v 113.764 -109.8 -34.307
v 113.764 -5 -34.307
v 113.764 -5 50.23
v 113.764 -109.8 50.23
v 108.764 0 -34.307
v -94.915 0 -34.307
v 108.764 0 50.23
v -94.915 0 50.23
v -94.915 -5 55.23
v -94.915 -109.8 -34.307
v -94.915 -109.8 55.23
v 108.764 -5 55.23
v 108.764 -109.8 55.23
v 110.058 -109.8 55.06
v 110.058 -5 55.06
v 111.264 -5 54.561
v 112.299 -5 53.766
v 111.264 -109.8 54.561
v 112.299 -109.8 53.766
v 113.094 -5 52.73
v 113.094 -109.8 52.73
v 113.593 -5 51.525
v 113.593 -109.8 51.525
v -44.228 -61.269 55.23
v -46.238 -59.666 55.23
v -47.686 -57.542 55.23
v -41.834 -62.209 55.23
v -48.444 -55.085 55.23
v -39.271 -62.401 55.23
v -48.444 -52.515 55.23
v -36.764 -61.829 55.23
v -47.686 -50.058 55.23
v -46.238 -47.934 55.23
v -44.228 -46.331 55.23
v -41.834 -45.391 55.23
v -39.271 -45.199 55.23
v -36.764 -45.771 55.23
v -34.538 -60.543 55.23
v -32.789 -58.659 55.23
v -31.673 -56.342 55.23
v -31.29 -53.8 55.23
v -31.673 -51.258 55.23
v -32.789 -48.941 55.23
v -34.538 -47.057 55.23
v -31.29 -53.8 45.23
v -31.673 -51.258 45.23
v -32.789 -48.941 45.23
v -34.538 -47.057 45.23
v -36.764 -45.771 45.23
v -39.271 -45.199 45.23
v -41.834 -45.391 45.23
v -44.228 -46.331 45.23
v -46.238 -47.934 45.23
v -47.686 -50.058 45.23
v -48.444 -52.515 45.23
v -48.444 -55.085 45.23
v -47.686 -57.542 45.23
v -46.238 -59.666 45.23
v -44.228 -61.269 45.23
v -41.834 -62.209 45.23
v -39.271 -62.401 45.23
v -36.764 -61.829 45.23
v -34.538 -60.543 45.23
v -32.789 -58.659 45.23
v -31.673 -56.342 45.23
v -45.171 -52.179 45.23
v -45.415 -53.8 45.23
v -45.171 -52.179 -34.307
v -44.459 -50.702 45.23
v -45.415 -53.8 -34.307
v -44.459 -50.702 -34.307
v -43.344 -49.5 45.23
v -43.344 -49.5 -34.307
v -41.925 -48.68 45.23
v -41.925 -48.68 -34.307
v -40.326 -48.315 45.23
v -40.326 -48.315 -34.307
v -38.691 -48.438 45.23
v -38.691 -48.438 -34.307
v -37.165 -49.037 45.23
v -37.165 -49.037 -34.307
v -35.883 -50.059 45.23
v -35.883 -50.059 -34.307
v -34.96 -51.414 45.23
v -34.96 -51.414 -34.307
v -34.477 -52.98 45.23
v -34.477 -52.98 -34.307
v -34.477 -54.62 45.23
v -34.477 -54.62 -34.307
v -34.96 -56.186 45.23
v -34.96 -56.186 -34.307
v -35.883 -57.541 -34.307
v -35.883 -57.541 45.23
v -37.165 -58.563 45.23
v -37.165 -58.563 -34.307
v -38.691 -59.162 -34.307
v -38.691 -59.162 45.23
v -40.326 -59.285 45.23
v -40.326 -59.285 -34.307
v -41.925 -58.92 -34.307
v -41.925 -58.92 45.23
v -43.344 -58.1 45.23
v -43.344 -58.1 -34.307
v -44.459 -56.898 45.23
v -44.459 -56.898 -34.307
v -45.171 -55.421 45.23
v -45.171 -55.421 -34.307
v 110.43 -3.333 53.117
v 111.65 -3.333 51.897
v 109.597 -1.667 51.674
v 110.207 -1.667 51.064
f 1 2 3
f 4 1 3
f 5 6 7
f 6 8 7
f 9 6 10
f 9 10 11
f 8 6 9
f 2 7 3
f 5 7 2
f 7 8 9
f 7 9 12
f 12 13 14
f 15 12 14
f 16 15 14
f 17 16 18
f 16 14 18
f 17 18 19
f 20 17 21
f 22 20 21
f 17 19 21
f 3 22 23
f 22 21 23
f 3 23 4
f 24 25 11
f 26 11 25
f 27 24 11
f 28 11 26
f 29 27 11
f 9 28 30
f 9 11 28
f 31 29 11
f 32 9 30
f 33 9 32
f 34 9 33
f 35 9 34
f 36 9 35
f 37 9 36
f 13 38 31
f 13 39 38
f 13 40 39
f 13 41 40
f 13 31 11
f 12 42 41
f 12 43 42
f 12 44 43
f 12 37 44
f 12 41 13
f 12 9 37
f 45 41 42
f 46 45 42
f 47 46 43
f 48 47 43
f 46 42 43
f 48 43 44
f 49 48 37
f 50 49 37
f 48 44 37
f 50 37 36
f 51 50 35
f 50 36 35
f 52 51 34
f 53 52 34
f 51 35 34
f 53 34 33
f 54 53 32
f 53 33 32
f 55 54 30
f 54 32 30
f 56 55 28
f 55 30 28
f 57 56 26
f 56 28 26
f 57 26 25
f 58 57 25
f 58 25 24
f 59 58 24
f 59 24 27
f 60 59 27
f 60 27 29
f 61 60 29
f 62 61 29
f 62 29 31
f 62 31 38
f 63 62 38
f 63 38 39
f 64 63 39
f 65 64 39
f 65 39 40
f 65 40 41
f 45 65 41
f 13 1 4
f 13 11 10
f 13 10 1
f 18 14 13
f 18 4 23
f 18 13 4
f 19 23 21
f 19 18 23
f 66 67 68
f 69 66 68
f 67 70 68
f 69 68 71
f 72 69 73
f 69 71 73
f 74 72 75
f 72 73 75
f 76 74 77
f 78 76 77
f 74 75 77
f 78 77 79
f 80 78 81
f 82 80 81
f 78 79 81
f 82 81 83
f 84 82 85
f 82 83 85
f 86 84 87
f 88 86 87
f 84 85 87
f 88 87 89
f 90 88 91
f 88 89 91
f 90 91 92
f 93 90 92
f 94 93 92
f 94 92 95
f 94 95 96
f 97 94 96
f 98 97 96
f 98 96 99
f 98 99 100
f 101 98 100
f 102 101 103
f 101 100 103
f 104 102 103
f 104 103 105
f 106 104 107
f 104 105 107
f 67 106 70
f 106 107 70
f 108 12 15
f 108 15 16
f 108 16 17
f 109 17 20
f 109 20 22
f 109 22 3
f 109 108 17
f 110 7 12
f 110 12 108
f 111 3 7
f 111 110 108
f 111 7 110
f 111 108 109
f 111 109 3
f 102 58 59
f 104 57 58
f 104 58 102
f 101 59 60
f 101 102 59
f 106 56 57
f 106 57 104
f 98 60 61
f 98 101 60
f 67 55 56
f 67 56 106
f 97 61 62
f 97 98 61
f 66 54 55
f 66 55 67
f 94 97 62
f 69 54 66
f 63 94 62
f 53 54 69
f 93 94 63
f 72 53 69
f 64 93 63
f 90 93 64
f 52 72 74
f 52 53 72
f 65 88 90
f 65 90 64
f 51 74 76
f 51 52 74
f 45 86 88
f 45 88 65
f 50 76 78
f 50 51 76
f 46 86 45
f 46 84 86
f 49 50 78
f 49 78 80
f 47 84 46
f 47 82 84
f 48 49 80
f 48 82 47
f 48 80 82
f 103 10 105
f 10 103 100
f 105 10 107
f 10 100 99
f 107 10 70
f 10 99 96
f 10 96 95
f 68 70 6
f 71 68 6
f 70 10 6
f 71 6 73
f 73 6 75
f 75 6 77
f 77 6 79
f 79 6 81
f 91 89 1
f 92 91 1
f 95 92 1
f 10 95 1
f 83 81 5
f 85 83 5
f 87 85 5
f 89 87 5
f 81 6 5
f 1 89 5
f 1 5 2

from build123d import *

# Parameters (mm, degrees)
F0_W           = 208.6787745357
F0_H           = 89.537139982
F1_DEPTH       = 109.8
F3_D           = 11
F3_CBORE_D     = 17.25
F3_CBORE_DEPTH = 10
F4_R           = 5
F5_SIZE        = 5


with BuildPart() as f1:
    # F0 (on Front) → F1 (new body)
    with BuildSketch(Plane.XZ):
        with Locations((9.4242058694, 10.4618463665)):
            Rectangle(F0_W, F0_H)
    extrude(amount=F1_DEPTH)

    # F3 (through all)
    with Locations(Plane.XY.offset(55.2304163575)):
        with Locations((-39.9151813984, -53.8)):
            CounterBoreHole(F3_D / 2, F3_CBORE_D / 2, F3_CBORE_DEPTH)

    # F4
    f4_edges = [f1.edges().sort_by_distance(p)[0] for p in [
        (113.763593, -54.9, 55.230416),
    ]]
    fillet(f4_edges, radius=F4_R)

    # F5
    f5_edges = [f1.edges().sort_by_distance(p)[0] for p in [
        (6.924206, 0, 55.230416),
    ]]
    chamfer(f5_edges, length=F5_SIZE)


solid = f1.part
